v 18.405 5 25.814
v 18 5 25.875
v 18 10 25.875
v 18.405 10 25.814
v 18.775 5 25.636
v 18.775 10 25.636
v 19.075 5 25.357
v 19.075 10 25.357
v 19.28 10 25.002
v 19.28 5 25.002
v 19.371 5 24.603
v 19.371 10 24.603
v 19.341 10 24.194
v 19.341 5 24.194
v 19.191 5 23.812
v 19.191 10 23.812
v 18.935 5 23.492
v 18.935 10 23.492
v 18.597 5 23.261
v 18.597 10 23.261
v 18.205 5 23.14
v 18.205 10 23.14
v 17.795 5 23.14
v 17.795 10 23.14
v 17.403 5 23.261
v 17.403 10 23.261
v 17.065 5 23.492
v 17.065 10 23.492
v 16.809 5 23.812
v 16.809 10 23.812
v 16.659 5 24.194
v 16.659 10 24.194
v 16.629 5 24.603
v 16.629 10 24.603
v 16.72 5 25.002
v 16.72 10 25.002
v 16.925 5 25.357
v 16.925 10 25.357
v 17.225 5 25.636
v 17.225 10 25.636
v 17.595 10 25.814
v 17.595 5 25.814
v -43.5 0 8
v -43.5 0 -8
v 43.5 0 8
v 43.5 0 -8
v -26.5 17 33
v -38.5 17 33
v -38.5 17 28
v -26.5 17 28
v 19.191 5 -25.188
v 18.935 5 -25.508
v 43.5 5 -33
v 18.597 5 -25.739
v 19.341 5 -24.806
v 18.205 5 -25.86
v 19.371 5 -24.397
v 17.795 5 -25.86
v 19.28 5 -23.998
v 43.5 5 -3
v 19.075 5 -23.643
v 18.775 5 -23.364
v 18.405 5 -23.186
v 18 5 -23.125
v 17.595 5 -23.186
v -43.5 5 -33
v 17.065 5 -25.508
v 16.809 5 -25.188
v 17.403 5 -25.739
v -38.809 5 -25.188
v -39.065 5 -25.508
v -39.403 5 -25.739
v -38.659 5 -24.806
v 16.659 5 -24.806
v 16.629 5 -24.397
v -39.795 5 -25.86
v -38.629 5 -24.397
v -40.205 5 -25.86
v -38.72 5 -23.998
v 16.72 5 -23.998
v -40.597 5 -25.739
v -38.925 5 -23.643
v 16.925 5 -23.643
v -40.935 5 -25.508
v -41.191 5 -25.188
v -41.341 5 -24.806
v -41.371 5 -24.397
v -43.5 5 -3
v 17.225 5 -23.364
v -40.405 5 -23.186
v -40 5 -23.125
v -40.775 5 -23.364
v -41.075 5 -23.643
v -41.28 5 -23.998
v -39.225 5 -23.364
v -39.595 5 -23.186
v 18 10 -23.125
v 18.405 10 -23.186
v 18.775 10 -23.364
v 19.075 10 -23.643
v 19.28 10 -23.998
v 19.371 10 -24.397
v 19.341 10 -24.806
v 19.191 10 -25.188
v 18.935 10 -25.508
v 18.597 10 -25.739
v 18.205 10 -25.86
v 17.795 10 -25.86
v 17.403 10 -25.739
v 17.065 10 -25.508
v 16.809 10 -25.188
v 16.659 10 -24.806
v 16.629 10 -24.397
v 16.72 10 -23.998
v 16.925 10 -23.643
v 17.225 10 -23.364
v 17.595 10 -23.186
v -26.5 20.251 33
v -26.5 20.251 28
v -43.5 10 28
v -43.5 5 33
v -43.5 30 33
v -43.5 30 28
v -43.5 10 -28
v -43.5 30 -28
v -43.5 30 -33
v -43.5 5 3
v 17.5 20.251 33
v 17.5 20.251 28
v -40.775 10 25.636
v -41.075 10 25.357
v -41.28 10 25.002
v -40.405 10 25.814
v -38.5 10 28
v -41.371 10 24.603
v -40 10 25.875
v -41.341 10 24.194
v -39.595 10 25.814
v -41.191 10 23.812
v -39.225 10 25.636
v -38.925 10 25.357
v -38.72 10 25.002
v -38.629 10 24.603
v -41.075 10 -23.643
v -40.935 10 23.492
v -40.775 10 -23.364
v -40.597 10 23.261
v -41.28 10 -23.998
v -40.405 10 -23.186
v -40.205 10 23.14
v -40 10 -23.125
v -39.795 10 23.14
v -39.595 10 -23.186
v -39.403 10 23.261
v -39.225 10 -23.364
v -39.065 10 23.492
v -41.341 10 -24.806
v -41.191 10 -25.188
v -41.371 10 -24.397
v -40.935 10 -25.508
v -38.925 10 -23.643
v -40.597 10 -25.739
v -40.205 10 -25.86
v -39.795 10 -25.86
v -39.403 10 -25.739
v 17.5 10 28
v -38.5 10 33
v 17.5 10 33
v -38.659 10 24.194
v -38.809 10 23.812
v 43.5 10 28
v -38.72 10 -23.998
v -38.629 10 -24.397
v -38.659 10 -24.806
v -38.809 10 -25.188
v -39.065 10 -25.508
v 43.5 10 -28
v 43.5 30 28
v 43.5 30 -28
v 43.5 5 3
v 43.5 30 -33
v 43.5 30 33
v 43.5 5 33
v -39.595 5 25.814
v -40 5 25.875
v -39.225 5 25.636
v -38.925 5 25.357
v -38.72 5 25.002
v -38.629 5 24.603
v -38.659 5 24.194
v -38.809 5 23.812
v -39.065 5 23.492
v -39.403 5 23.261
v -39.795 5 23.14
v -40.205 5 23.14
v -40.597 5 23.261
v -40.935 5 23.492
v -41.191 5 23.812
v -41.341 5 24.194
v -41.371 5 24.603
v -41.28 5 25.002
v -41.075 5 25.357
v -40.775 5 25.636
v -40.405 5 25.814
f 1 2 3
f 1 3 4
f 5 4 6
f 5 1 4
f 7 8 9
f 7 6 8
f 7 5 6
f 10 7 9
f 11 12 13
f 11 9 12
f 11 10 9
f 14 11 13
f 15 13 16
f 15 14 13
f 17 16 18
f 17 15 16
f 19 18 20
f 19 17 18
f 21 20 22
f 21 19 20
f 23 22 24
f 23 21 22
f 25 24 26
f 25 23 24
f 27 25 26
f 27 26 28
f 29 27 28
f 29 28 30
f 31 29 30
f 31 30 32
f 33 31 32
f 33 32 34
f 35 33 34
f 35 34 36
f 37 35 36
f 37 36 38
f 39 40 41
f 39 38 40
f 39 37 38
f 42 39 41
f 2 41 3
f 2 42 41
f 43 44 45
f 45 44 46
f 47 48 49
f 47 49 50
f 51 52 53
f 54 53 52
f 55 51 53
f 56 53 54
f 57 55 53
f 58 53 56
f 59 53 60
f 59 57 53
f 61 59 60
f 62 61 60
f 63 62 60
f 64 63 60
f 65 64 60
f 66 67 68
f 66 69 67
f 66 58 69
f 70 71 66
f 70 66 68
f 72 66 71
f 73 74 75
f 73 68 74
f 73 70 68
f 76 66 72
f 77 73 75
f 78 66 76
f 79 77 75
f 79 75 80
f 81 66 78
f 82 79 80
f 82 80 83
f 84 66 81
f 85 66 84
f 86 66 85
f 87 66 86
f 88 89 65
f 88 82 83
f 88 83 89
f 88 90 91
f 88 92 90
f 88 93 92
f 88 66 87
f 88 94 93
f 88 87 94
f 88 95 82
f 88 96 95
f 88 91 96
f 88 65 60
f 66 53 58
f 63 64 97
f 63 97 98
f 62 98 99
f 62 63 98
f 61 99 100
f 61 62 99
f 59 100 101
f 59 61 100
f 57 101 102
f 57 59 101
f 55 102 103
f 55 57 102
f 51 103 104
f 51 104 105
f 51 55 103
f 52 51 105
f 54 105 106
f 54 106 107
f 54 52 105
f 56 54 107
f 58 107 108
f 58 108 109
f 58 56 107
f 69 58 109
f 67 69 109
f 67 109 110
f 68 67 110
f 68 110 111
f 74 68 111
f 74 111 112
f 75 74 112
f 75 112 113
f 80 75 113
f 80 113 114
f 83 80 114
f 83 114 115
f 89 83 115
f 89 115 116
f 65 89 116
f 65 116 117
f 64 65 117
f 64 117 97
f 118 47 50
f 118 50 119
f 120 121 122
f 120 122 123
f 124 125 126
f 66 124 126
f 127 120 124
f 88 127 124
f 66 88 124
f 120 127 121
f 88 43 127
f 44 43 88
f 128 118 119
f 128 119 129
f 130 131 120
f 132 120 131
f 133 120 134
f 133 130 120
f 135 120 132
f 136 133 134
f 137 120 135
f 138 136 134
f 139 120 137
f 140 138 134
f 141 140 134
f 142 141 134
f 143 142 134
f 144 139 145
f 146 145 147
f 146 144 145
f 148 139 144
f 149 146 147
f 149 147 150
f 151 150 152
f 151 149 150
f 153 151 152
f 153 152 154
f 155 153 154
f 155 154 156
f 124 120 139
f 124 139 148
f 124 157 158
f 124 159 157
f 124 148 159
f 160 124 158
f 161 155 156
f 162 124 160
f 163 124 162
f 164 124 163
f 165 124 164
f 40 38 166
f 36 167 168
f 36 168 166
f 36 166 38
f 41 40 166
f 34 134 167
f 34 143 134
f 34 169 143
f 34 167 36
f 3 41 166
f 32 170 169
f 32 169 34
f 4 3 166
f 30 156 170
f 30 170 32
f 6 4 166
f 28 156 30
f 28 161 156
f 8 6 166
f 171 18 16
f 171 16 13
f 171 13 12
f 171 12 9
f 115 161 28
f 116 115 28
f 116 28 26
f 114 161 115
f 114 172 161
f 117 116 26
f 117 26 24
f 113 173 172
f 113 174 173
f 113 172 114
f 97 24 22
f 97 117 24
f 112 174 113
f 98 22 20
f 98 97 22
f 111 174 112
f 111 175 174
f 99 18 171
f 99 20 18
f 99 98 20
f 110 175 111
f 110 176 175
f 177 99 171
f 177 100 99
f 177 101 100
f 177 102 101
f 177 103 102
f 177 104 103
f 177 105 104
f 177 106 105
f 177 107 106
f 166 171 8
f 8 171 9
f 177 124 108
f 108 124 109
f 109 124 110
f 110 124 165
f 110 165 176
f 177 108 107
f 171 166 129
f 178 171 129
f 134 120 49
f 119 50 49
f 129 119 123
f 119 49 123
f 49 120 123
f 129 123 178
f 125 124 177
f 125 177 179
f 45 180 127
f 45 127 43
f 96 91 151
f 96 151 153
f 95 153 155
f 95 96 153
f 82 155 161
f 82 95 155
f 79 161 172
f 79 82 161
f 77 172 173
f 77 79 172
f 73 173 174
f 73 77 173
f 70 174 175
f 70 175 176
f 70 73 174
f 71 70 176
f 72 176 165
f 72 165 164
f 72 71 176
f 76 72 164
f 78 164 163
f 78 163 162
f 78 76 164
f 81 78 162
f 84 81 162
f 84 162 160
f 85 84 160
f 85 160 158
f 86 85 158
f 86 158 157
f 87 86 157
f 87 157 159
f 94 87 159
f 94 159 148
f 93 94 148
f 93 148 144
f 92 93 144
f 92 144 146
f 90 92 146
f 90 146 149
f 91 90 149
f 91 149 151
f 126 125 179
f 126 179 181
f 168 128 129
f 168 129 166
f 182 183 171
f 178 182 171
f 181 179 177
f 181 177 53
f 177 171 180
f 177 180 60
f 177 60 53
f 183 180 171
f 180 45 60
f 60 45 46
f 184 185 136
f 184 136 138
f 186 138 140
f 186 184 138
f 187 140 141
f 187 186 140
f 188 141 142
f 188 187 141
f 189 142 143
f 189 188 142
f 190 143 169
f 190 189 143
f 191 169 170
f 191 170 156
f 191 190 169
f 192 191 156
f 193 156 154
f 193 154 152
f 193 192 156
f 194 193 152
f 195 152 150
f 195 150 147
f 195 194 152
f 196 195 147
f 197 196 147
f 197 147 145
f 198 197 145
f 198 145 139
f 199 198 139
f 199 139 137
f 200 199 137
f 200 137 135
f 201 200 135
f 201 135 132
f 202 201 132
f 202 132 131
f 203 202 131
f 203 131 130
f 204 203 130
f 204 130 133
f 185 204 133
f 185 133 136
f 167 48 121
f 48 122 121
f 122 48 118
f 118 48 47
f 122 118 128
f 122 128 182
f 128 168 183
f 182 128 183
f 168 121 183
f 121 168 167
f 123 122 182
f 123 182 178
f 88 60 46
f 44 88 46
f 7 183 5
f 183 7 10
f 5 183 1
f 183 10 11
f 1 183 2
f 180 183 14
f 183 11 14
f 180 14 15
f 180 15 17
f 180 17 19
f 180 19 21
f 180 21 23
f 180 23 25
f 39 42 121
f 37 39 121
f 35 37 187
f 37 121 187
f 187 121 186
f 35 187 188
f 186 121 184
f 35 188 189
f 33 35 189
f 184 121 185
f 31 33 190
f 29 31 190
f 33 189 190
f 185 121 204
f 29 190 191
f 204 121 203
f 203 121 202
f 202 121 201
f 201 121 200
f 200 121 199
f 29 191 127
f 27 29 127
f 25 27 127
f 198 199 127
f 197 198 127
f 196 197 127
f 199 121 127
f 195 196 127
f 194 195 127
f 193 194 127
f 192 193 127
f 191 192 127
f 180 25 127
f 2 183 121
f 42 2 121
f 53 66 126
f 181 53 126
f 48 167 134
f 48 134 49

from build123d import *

# Parameters (mm, degrees)
SKETCH1_W                = 87
SKETCH1_H                = 66
SKETCH1_R                = 1.375
BOSS_EXTRUDE1_DEPTH      = 10
CUT_EXTRUDE1_DEPTH       = 56.509008278
CUT_EXTRUDE1_DEPTH_BACK  = 56.509008278
BOSS_EXTRUDE2_DEPTH      = 43.5
BOSS_EXTRUDE2_DEPTH_BACK = 43.5
SKETCH3_W                = 5
SKETCH3_H                = 20
CUT_EXTRUDE2_DEPTH       = 10


with BuildPart() as part:
    # Sketch1 → Boss-Extrude1 (new body)
    with BuildSketch(Plane(origin=(0, 0, 0), x_dir=(1, 0, 0), z_dir=(0, 1, 0))):
        Rectangle(SKETCH1_W, SKETCH1_H)
        with Locations(Location((-40, 24.5, 0), (0, 0, 270))):
            Circle(SKETCH1_R, mode=Mode.SUBTRACT)
        with Locations(Location((-40, -24.5, 0), (0, 0, 270))):
            Circle(SKETCH1_R, mode=Mode.SUBTRACT)
        with Locations(Location((18, 24.5, 0), (0, 0, 270))):
            Circle(SKETCH1_R, mode=Mode.SUBTRACT)
        with Locations(Location((18, -24.5, 0), (0, 0, 270))):
            Circle(SKETCH1_R, mode=Mode.SUBTRACT)
    extrude(amount=BOSS_EXTRUDE1_DEPTH)

    # Sketch2 → Cut-Extrude1 (cut, two sides: drawn at the far end of the back side and taken through both)
    with BuildSketch(Plane(origin=(0, 0, 0), x_dir=(0, 0, -1), z_dir=(1, 0, 0)).offset(-CUT_EXTRUDE1_DEPTH_BACK)):
        Polygon((33, 5), (3, 5), (8, 0), (33, 0), align=None)
        Polygon((-33, 5), (-3, 5), (-8, 0), (-33, 0), align=None)
    extrude(amount=CUT_EXTRUDE1_DEPTH + CUT_EXTRUDE1_DEPTH_BACK, mode=Mode.SUBTRACT)

    # Sketch3 → Boss-Extrude2 (add, two sides: drawn at the far end of the back side and taken through both)
    with BuildSketch(Plane(origin=(0, 0, 0), x_dir=(0, 0, -1), z_dir=(1, 0, 0)).offset(-BOSS_EXTRUDE2_DEPTH_BACK)):
        with Locations((30.5, 20)):
            Rectangle(SKETCH3_W, SKETCH3_H)
        with Locations((-30.5, 20)):
            Rectangle(SKETCH3_W, SKETCH3_H)
    extrude(amount=BOSS_EXTRUDE2_DEPTH + BOSS_EXTRUDE2_DEPTH_BACK)

    # Sketch4 → Cut-Extrude2 (cut)
    with BuildSketch(Plane.XY.offset(33)):
        Polygon((-26.5, 17), (-26.5, 20.250689265), (17.5, 20.250689265), (17.5, 10), (-26.5, 10), (-38.5, 10), (-38.5, 17), align=None)
    extrude(amount=-CUT_EXTRUDE2_DEPTH, mode=Mode.SUBTRACT)


solid = part.part
